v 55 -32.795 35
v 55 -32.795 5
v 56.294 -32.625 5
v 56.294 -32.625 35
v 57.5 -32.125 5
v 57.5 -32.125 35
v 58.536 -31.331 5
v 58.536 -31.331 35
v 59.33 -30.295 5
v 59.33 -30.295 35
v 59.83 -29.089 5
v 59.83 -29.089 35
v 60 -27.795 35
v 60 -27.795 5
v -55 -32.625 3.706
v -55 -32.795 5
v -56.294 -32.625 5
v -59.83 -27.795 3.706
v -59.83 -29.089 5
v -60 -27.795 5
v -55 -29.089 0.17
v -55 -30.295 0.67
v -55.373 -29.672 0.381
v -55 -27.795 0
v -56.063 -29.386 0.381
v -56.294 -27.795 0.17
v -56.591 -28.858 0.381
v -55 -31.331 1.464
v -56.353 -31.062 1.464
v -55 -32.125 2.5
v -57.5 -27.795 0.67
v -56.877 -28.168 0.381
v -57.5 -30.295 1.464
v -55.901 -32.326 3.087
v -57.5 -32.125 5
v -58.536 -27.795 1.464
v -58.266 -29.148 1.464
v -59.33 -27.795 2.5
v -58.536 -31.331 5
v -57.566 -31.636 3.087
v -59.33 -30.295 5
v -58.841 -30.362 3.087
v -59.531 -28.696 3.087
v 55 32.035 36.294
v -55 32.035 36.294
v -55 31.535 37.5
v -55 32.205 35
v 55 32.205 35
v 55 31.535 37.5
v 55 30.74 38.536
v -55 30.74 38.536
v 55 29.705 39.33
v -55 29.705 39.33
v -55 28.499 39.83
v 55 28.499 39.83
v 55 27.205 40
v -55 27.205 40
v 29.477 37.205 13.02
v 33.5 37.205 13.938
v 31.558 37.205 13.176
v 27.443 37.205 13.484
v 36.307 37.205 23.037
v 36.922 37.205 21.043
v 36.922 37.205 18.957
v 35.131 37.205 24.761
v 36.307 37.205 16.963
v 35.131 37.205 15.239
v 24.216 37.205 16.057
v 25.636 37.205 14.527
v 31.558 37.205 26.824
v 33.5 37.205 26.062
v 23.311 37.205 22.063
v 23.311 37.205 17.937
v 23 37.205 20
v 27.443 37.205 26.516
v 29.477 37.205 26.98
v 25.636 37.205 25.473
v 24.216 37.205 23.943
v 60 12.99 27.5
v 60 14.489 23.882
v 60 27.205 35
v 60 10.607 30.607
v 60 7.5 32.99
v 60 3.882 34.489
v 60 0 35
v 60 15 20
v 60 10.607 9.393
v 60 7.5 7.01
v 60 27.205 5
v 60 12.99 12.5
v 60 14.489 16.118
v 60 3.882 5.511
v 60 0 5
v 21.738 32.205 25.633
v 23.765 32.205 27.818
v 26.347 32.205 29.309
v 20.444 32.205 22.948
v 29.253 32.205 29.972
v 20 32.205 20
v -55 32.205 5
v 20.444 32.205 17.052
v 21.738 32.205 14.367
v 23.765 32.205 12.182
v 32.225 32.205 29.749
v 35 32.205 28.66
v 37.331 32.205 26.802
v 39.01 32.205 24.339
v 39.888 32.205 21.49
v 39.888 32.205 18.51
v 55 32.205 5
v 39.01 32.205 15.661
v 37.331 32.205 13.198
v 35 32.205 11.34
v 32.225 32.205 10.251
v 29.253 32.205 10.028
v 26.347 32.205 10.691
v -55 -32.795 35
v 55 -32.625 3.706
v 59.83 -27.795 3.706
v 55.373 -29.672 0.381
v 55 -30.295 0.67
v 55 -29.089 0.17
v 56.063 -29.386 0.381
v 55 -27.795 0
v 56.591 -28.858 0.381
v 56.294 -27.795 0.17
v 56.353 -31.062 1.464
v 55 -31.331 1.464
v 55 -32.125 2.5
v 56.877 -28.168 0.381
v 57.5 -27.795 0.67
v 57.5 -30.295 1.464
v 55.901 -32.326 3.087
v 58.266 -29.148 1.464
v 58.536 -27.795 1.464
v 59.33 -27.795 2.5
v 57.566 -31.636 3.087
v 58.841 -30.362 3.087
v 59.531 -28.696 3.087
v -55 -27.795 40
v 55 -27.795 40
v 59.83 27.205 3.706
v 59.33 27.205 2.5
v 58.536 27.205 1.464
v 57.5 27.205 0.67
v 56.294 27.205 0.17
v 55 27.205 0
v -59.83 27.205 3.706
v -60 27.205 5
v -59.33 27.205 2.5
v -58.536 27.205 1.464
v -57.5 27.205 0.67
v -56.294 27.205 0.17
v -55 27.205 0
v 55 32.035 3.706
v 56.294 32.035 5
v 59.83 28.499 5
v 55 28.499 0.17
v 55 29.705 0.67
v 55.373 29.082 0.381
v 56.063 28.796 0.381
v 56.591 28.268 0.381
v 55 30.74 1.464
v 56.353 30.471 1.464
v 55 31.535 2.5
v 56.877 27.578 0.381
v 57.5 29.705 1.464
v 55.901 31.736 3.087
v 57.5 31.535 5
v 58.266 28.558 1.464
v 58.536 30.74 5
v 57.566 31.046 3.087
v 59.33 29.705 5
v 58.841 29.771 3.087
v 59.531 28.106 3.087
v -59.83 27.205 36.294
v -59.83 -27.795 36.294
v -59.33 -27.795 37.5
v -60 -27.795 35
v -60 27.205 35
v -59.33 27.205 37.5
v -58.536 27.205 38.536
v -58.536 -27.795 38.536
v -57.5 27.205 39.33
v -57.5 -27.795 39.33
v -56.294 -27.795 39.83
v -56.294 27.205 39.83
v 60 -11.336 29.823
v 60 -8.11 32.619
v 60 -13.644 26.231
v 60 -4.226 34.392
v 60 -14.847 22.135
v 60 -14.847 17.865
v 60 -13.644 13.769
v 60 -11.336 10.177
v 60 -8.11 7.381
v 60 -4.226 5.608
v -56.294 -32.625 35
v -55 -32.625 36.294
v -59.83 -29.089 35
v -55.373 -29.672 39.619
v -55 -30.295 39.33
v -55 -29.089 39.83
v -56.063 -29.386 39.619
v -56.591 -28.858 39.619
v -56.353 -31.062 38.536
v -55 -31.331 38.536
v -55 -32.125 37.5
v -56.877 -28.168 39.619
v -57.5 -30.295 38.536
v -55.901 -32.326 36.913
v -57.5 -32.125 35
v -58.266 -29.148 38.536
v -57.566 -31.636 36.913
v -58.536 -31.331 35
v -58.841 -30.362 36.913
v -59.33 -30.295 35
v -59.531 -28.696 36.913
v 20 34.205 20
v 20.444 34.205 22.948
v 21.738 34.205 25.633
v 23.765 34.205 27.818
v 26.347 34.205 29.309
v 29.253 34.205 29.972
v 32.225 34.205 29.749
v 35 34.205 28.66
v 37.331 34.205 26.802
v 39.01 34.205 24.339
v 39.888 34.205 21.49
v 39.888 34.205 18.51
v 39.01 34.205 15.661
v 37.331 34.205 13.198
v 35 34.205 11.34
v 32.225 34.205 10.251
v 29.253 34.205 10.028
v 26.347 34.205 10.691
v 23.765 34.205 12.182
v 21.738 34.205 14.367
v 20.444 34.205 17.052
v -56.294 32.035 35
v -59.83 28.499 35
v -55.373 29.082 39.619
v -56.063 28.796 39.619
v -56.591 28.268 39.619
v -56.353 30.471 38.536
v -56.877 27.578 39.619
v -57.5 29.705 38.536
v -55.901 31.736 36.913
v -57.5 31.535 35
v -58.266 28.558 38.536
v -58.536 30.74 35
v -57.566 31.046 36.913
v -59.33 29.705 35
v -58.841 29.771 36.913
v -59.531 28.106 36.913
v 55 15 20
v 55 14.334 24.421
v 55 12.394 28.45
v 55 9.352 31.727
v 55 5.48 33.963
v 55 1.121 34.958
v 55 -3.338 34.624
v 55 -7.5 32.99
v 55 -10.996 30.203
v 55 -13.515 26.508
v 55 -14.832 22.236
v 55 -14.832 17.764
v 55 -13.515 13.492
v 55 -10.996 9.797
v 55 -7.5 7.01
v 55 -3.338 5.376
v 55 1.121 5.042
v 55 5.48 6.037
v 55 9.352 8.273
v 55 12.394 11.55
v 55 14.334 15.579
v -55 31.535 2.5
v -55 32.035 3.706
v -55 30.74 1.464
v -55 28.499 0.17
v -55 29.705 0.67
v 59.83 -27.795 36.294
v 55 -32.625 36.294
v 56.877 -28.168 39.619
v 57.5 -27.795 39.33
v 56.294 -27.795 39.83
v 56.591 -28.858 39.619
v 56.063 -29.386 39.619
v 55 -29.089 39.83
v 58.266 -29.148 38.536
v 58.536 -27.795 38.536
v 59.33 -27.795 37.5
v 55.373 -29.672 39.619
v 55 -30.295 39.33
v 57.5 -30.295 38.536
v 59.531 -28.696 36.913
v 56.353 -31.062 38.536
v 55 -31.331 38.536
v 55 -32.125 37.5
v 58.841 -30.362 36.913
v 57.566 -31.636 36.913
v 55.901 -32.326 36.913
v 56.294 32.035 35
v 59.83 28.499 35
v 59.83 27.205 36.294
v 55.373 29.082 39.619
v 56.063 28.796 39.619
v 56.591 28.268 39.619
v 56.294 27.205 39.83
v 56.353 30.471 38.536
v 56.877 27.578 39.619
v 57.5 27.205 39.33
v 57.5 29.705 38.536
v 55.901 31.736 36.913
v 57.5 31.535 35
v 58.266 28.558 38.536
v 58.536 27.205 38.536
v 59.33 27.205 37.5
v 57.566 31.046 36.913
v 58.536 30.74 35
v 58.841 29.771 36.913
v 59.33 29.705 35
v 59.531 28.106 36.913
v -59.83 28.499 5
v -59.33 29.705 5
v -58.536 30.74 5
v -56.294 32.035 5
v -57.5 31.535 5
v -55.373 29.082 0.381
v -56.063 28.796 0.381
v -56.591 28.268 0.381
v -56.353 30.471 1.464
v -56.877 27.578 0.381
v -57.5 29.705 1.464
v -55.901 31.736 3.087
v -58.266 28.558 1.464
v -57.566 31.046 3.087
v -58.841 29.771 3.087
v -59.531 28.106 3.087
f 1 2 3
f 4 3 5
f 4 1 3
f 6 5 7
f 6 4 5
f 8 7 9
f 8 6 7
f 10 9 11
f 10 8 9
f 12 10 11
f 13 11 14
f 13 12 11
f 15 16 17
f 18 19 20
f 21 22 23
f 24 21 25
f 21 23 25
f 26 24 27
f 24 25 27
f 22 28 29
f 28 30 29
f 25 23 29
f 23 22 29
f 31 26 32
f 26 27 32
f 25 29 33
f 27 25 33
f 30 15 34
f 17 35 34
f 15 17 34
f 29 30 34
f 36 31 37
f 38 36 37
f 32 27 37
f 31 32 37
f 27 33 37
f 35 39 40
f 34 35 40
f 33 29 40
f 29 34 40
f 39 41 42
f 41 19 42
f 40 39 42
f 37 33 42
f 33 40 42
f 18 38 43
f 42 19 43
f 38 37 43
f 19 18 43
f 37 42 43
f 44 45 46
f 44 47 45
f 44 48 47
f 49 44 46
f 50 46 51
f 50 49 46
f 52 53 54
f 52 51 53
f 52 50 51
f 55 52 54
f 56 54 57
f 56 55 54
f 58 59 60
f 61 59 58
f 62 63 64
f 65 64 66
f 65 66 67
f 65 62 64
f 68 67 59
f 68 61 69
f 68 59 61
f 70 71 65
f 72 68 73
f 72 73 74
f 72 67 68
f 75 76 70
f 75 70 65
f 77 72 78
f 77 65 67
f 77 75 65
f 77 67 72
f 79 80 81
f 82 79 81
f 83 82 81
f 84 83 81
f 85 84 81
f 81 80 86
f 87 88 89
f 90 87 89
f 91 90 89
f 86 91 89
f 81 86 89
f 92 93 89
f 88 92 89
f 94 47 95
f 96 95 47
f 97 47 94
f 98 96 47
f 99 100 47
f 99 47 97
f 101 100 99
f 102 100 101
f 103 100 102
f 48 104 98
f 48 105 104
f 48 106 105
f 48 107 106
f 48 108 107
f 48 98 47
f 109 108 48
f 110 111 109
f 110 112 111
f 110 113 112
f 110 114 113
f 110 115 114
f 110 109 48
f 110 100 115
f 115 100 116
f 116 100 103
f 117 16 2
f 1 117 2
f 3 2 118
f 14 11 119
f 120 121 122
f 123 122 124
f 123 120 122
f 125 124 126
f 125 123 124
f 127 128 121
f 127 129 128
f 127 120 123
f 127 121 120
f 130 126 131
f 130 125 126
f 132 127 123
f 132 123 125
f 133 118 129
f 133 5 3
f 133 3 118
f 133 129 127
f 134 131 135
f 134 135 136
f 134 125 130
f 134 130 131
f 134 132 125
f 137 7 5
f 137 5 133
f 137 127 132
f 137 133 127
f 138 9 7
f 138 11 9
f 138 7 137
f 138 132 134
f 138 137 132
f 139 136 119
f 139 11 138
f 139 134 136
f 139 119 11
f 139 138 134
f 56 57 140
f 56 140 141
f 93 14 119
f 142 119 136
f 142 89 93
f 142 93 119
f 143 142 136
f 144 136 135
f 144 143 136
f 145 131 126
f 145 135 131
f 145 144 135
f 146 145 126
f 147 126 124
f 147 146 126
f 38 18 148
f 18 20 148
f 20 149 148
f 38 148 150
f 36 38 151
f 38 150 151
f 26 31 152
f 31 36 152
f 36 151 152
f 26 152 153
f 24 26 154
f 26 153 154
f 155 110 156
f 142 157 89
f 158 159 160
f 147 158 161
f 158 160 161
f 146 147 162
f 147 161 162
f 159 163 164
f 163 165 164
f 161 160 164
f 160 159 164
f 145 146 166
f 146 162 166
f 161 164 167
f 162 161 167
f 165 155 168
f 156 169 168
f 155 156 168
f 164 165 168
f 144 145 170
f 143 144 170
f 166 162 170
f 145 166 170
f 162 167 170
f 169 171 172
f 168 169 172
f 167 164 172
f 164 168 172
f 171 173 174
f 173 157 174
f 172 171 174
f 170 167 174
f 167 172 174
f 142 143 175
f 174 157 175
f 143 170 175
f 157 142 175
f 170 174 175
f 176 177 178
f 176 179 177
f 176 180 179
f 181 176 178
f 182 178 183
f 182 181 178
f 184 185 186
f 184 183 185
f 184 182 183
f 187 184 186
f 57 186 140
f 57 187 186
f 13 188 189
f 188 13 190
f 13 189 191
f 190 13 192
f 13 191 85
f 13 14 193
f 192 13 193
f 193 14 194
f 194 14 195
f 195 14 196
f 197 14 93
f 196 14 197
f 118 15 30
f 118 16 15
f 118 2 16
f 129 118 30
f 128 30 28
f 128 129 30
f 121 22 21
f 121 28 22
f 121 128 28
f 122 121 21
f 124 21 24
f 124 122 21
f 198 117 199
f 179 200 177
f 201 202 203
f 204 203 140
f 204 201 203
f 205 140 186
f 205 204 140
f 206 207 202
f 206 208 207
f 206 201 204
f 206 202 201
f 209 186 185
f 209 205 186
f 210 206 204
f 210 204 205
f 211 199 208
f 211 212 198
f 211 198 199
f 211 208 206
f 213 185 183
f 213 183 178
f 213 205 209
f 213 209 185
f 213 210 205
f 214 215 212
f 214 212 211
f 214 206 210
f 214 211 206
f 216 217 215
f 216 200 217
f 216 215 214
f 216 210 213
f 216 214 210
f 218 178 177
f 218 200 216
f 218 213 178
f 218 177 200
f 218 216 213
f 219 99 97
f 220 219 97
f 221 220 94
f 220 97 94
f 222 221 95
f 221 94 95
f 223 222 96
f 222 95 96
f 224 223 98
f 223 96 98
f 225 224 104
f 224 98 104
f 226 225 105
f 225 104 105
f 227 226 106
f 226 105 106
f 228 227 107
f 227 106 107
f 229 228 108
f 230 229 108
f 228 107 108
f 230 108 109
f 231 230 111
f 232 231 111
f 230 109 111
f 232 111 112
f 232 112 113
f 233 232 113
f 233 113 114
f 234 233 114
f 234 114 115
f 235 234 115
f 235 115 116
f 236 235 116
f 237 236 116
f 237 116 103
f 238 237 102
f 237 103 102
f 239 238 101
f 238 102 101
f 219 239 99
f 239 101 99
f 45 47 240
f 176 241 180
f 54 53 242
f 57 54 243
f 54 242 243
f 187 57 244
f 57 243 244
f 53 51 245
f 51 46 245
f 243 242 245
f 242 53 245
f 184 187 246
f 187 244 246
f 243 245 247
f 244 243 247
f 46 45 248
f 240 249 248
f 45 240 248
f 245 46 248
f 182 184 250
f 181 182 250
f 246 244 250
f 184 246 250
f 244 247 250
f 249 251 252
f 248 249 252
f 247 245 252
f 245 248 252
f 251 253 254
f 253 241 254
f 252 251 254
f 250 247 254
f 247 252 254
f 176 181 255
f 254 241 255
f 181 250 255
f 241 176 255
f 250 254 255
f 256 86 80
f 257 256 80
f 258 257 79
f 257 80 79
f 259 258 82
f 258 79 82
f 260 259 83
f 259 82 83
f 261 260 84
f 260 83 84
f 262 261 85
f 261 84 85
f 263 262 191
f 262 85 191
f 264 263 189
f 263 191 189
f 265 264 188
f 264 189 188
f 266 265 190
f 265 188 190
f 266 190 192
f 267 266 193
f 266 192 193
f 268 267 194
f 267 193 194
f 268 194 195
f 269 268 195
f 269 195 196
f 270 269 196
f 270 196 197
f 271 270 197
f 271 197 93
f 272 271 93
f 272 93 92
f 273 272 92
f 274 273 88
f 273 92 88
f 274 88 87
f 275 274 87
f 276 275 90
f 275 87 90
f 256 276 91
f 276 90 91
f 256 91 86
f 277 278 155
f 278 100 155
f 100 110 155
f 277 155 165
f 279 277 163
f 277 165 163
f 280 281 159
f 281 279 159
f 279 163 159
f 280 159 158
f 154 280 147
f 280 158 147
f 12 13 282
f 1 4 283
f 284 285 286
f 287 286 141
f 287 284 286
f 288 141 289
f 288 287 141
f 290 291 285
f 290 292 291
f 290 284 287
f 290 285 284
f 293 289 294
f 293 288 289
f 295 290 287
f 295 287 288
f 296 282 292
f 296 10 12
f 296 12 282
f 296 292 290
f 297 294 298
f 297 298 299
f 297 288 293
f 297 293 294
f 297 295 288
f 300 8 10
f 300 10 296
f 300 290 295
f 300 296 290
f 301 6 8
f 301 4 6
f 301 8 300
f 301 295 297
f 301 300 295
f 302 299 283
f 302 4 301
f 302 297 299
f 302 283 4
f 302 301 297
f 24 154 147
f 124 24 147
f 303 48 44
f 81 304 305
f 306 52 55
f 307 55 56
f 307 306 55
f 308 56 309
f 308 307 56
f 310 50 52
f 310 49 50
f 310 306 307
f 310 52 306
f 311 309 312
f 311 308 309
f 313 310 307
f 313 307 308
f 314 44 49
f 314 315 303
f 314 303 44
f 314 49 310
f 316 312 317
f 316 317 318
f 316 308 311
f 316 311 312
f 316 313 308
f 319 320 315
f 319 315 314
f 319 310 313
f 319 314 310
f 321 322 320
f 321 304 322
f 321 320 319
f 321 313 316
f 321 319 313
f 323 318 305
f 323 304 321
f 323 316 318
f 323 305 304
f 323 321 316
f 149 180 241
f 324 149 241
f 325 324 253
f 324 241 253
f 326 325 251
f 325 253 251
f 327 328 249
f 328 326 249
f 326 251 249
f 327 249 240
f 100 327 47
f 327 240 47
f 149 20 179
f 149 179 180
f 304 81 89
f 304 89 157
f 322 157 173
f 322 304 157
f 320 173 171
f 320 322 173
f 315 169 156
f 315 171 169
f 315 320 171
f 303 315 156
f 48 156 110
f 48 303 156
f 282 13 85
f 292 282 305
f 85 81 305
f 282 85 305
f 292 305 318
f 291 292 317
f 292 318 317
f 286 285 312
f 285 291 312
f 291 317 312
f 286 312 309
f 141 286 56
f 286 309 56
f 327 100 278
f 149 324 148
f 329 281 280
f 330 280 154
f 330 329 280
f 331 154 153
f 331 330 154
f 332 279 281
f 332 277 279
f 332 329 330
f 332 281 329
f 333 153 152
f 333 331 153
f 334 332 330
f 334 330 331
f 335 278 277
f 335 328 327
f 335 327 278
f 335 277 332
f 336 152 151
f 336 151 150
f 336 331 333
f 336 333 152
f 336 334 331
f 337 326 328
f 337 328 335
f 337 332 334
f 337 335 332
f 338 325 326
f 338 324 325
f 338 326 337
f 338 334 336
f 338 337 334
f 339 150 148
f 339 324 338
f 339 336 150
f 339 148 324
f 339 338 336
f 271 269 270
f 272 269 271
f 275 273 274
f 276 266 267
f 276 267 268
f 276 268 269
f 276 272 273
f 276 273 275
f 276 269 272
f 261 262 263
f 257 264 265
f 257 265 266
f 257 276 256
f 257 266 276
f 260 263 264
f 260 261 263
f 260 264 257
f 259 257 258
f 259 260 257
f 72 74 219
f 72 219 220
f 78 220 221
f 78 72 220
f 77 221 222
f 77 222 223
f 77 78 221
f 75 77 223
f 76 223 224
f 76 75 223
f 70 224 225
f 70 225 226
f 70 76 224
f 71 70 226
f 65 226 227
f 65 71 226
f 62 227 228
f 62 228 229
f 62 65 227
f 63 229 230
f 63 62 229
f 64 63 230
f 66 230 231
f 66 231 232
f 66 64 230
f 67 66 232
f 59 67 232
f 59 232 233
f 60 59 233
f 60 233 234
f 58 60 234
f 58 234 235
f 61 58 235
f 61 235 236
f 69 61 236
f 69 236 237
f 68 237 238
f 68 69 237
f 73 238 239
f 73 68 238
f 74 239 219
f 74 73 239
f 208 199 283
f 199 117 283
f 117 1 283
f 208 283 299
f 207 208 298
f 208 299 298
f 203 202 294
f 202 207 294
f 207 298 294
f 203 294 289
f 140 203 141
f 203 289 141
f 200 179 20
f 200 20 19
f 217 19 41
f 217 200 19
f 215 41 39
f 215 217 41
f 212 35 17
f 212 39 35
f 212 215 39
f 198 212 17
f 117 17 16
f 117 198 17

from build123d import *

# Parameters (mm, degrees)
F0_W     = 120
F0_H     = 65
F1_DEPTH = 40
F2_R     = 5
F3_R     = 15
F4_DEPTH = 5
F5_R     = 10
F6_DEPTH = 5
F7_SIZE  = 3


with BuildPart() as f1:
    # F0 (on Top) → F1 (new body)
    with BuildSketch(Plane.XY):
        with Locations((0, -0.295118)):
            Rectangle(F0_W, F0_H)
    extrude(amount=F1_DEPTH)

    # F2
    f2_edges = [f1.edges().sort_by_distance(p)[0] for p in [
        (-60, -32.795118, 20),
        (60, -32.795118, 20),
        (60, 32.204882, 20),
        (-60, 32.204882, 20),
        (0, 32.204882, 40),
        (60, -0.295118, 40),
        (0, -32.795118, 40),
        (-60, -0.295118, 40),
        (0, 32.204882, 0),
        (0, -32.795118, 0),
        (-60, -0.295118, 0),
        (60, -0.295118, 0),
    ]]
    fillet(f2_edges, radius=F2_R)

    # F3 (on face) → F4 (cut)
    with BuildSketch(Plane.YZ.offset(60)):
        with Locations((0, 20)):
            Circle(F3_R)
    extrude(amount=-F4_DEPTH, mode=Mode.SUBTRACT)

    # F5 (on face) → F6 (join)
    with BuildSketch(Plane(origin=(0, 32.204882, 0), x_dir=(-1, 0, 0), z_dir=(0, 1, 0))):
        with Locations((-30, 20)):
            Circle(F5_R)
    extrude(amount=F6_DEPTH)

    # F7
    f7_edges = [f1.edges().sort_by_distance(p)[0] for p in [
        (40, 37.204882, 20),
    ]]
    chamfer(f7_edges, length=F7_SIZE)


solid = f1.part
